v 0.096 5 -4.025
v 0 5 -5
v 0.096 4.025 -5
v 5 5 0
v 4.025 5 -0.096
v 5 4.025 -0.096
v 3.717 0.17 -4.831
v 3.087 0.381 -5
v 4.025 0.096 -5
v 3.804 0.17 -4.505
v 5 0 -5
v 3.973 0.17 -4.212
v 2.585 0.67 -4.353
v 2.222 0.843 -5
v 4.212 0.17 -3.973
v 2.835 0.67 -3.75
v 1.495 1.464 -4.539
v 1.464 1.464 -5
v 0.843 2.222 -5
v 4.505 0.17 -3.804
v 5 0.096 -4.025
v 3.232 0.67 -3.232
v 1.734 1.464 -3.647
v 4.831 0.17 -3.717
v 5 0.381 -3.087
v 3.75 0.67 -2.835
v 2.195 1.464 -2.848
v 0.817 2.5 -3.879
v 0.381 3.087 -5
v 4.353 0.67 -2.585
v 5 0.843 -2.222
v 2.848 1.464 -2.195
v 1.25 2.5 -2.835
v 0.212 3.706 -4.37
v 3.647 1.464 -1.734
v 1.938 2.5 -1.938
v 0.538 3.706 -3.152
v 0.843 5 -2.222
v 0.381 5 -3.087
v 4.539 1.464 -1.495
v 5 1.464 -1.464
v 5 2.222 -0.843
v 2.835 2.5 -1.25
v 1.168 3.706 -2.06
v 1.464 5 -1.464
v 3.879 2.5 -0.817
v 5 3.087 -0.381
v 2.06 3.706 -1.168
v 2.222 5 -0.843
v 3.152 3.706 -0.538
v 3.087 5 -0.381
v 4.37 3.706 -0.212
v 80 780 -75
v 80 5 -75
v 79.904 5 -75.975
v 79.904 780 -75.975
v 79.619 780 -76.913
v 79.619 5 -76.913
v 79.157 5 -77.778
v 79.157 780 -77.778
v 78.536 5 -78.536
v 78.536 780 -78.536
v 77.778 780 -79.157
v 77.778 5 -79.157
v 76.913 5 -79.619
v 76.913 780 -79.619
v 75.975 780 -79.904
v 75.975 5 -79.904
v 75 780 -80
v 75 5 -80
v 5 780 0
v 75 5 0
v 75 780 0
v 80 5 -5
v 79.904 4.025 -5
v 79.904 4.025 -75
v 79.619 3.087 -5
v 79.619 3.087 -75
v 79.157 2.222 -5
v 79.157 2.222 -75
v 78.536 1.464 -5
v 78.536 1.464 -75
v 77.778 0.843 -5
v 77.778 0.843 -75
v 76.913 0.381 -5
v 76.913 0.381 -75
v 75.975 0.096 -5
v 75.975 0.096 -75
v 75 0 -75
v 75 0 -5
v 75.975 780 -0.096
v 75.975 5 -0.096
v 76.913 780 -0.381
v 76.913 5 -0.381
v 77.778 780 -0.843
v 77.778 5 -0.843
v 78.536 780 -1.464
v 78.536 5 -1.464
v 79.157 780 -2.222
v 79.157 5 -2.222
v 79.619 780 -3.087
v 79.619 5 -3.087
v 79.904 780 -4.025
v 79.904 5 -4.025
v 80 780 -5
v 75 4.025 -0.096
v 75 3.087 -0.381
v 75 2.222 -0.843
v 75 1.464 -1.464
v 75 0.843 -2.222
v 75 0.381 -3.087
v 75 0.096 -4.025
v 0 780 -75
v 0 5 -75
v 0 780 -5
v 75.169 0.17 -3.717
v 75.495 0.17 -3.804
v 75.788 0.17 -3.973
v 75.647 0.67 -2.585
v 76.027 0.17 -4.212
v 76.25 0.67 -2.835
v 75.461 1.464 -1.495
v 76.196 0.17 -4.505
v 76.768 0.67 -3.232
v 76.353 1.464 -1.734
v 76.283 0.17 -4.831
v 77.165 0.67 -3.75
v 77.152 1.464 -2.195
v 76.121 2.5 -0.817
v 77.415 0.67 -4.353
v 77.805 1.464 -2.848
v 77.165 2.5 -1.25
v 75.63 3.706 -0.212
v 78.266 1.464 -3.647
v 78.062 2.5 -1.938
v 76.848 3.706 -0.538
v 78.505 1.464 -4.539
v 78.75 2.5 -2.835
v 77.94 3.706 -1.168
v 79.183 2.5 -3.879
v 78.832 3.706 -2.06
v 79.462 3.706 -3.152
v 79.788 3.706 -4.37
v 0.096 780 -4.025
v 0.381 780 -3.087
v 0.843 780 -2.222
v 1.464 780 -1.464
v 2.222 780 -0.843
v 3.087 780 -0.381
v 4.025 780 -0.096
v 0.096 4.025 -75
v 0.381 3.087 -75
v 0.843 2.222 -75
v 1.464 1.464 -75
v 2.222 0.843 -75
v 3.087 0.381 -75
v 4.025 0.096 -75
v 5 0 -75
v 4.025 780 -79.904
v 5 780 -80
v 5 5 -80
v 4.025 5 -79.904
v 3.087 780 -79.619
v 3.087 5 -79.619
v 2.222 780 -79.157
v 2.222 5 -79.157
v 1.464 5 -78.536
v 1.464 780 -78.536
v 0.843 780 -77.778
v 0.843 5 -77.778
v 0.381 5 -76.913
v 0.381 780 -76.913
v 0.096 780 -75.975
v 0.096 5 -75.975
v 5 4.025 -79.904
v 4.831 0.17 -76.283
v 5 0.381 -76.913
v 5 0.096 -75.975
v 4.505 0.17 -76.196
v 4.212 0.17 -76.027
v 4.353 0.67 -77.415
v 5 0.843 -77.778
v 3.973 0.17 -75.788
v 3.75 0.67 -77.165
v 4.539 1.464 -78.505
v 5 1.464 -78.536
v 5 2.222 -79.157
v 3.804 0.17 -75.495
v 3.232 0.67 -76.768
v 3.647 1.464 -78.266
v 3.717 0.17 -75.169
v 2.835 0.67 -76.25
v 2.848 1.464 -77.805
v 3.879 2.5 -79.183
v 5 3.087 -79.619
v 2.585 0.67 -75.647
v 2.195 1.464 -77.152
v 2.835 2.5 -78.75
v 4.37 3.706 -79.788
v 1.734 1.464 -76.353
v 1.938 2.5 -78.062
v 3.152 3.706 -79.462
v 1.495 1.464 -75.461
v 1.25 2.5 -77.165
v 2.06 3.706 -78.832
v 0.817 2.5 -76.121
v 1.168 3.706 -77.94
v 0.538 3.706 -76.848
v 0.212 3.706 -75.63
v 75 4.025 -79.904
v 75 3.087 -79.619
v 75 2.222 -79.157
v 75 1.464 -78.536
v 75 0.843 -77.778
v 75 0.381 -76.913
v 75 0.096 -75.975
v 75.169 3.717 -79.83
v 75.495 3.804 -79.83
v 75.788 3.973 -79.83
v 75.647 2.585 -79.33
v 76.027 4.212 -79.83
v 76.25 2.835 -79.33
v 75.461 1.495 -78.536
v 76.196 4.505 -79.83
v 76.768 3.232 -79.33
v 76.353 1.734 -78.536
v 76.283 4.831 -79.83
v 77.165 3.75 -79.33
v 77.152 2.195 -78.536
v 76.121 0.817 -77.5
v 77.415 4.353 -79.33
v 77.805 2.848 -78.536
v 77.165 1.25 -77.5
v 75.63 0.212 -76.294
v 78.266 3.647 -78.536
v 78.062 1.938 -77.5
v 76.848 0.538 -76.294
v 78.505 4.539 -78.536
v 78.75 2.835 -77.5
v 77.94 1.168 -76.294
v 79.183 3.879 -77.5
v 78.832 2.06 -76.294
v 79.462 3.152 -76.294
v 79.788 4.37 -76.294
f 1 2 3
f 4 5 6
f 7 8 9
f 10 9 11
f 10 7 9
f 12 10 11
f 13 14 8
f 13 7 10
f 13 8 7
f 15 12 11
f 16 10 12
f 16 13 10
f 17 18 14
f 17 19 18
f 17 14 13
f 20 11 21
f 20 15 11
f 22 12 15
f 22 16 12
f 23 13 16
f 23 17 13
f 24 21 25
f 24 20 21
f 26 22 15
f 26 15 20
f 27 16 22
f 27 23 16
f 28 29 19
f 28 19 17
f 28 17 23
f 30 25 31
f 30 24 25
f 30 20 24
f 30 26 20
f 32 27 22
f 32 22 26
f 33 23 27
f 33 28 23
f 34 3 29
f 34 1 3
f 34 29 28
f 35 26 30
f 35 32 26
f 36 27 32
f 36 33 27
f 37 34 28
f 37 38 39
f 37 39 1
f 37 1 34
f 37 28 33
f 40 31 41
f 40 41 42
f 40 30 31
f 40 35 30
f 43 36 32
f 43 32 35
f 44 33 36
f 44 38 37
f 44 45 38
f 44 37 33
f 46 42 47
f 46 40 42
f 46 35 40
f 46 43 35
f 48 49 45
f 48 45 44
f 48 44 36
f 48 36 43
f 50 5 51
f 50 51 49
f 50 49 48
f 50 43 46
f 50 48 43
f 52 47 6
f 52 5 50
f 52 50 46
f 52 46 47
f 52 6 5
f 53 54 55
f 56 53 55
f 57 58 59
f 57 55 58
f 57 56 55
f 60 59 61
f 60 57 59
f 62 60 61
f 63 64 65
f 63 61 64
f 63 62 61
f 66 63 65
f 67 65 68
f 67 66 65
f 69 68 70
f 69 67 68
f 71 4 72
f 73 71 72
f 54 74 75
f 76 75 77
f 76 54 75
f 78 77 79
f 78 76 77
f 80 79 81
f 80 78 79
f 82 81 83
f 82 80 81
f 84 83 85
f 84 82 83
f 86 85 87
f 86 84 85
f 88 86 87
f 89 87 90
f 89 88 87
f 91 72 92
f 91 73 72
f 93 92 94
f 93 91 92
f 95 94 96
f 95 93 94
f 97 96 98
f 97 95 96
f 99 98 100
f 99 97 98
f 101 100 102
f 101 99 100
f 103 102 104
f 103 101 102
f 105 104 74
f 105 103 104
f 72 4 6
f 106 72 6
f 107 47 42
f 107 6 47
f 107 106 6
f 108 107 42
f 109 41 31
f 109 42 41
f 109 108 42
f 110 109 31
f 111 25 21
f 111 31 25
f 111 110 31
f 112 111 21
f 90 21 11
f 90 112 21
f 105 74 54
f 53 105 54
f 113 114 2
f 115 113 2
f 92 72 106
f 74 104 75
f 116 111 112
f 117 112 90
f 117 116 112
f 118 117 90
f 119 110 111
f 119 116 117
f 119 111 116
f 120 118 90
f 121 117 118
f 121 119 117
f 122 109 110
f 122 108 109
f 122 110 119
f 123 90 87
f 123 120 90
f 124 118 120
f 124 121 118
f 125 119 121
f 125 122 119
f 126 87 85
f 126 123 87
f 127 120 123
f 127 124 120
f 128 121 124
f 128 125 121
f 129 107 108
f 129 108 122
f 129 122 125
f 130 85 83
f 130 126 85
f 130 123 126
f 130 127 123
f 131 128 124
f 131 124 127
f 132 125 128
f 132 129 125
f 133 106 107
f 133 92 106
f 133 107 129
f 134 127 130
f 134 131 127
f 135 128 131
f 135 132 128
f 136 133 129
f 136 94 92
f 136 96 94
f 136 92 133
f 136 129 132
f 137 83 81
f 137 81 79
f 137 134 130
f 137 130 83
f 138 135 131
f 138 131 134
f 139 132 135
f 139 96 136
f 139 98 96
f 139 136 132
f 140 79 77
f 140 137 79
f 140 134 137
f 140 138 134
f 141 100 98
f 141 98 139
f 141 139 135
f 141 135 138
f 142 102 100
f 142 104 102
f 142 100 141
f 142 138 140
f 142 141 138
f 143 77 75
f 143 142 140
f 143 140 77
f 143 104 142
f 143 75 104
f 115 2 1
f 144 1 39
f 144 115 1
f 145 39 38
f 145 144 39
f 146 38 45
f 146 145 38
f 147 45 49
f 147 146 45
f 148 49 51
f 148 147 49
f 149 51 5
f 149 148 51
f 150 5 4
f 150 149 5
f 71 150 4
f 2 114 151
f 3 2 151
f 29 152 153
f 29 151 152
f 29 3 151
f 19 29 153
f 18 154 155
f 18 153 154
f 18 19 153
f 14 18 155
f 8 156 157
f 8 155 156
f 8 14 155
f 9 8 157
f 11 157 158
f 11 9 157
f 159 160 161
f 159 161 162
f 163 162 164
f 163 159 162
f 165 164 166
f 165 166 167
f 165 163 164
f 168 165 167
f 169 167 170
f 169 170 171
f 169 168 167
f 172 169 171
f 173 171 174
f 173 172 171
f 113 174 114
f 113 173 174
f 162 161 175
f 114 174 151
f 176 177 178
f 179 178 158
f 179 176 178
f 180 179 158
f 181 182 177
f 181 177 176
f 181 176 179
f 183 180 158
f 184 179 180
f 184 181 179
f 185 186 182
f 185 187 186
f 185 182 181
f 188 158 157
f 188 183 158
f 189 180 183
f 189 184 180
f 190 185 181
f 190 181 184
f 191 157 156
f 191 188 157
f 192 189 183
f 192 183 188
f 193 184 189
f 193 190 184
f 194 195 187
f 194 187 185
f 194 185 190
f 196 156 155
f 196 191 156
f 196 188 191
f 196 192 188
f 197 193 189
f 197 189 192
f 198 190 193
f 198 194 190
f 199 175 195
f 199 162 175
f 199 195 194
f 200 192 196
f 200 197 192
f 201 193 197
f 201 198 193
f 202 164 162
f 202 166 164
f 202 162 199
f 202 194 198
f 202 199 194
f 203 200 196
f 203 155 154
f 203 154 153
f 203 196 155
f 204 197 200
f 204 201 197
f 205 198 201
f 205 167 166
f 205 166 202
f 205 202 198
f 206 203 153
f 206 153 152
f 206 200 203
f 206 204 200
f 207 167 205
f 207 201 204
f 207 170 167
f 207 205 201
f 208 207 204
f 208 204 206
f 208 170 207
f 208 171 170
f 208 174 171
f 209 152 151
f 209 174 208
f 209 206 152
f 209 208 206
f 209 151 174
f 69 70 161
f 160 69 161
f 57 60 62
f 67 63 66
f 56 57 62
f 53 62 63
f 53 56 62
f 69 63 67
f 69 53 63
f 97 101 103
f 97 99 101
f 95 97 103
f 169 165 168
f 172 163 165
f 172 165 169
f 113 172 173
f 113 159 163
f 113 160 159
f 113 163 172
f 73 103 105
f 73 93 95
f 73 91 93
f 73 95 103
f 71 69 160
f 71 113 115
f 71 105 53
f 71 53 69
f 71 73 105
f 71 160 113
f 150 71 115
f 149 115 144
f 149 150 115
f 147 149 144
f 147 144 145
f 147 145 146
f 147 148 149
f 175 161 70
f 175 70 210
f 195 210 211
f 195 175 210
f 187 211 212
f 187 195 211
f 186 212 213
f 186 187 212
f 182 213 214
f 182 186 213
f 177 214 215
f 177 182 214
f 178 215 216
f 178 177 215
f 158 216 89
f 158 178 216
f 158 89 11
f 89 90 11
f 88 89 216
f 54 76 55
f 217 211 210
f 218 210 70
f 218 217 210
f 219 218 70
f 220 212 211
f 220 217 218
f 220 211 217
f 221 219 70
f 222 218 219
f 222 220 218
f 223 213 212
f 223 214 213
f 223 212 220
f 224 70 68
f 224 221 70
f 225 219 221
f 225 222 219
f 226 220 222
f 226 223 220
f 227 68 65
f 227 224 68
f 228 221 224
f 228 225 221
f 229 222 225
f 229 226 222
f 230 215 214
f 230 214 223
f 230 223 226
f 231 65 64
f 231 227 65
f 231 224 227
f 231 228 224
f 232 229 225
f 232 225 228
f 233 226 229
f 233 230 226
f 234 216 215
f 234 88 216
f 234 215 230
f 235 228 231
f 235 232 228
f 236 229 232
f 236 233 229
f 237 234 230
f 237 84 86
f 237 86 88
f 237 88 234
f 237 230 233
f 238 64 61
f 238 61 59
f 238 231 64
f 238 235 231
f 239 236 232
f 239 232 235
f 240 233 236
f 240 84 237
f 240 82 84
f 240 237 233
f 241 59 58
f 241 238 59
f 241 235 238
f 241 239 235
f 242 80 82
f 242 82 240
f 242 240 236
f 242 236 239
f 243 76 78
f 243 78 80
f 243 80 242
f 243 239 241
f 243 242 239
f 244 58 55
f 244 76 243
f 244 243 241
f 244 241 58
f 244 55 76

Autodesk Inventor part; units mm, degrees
ref_plane "YZ Plane" through (0, 0, 0) normal (1, 0, 0) x (0, 1, 0)
ref_plane "XZ Plane" through (0, 0, 0) normal (0, 1, 0) x (-1, 0, 0)
ref_plane "XY Plane" through (0, 0, 0) normal (0, 0, 1) x (1, 0, 0)
sketch "Sketch1" plane through (0, 0, 0) normal (0, 1, 0) x (-1, 0, 0)
  line L0 (0, 0) -> (-80, 0)
  line L1 (-80, 0) -> (-80, -80)
  line L2 (-80, -80) -> (0, -80)
  line L3 (0, -80) -> (0, 0)
  dimension "d0" = 80
  dimension "d1" = 80
extrude "Extrusion1" add sketch "Sketch1" along normal blind 780
fillet "Fillet1" radius 5 8 edges at (80, 390, 0) (0, 390, 0) (40, 0, 0) (80, 0, -40) (80, 390, -80) (0, 390, -80) (40, 0, -80) (0, 0, -40)
properties part number "noha"
